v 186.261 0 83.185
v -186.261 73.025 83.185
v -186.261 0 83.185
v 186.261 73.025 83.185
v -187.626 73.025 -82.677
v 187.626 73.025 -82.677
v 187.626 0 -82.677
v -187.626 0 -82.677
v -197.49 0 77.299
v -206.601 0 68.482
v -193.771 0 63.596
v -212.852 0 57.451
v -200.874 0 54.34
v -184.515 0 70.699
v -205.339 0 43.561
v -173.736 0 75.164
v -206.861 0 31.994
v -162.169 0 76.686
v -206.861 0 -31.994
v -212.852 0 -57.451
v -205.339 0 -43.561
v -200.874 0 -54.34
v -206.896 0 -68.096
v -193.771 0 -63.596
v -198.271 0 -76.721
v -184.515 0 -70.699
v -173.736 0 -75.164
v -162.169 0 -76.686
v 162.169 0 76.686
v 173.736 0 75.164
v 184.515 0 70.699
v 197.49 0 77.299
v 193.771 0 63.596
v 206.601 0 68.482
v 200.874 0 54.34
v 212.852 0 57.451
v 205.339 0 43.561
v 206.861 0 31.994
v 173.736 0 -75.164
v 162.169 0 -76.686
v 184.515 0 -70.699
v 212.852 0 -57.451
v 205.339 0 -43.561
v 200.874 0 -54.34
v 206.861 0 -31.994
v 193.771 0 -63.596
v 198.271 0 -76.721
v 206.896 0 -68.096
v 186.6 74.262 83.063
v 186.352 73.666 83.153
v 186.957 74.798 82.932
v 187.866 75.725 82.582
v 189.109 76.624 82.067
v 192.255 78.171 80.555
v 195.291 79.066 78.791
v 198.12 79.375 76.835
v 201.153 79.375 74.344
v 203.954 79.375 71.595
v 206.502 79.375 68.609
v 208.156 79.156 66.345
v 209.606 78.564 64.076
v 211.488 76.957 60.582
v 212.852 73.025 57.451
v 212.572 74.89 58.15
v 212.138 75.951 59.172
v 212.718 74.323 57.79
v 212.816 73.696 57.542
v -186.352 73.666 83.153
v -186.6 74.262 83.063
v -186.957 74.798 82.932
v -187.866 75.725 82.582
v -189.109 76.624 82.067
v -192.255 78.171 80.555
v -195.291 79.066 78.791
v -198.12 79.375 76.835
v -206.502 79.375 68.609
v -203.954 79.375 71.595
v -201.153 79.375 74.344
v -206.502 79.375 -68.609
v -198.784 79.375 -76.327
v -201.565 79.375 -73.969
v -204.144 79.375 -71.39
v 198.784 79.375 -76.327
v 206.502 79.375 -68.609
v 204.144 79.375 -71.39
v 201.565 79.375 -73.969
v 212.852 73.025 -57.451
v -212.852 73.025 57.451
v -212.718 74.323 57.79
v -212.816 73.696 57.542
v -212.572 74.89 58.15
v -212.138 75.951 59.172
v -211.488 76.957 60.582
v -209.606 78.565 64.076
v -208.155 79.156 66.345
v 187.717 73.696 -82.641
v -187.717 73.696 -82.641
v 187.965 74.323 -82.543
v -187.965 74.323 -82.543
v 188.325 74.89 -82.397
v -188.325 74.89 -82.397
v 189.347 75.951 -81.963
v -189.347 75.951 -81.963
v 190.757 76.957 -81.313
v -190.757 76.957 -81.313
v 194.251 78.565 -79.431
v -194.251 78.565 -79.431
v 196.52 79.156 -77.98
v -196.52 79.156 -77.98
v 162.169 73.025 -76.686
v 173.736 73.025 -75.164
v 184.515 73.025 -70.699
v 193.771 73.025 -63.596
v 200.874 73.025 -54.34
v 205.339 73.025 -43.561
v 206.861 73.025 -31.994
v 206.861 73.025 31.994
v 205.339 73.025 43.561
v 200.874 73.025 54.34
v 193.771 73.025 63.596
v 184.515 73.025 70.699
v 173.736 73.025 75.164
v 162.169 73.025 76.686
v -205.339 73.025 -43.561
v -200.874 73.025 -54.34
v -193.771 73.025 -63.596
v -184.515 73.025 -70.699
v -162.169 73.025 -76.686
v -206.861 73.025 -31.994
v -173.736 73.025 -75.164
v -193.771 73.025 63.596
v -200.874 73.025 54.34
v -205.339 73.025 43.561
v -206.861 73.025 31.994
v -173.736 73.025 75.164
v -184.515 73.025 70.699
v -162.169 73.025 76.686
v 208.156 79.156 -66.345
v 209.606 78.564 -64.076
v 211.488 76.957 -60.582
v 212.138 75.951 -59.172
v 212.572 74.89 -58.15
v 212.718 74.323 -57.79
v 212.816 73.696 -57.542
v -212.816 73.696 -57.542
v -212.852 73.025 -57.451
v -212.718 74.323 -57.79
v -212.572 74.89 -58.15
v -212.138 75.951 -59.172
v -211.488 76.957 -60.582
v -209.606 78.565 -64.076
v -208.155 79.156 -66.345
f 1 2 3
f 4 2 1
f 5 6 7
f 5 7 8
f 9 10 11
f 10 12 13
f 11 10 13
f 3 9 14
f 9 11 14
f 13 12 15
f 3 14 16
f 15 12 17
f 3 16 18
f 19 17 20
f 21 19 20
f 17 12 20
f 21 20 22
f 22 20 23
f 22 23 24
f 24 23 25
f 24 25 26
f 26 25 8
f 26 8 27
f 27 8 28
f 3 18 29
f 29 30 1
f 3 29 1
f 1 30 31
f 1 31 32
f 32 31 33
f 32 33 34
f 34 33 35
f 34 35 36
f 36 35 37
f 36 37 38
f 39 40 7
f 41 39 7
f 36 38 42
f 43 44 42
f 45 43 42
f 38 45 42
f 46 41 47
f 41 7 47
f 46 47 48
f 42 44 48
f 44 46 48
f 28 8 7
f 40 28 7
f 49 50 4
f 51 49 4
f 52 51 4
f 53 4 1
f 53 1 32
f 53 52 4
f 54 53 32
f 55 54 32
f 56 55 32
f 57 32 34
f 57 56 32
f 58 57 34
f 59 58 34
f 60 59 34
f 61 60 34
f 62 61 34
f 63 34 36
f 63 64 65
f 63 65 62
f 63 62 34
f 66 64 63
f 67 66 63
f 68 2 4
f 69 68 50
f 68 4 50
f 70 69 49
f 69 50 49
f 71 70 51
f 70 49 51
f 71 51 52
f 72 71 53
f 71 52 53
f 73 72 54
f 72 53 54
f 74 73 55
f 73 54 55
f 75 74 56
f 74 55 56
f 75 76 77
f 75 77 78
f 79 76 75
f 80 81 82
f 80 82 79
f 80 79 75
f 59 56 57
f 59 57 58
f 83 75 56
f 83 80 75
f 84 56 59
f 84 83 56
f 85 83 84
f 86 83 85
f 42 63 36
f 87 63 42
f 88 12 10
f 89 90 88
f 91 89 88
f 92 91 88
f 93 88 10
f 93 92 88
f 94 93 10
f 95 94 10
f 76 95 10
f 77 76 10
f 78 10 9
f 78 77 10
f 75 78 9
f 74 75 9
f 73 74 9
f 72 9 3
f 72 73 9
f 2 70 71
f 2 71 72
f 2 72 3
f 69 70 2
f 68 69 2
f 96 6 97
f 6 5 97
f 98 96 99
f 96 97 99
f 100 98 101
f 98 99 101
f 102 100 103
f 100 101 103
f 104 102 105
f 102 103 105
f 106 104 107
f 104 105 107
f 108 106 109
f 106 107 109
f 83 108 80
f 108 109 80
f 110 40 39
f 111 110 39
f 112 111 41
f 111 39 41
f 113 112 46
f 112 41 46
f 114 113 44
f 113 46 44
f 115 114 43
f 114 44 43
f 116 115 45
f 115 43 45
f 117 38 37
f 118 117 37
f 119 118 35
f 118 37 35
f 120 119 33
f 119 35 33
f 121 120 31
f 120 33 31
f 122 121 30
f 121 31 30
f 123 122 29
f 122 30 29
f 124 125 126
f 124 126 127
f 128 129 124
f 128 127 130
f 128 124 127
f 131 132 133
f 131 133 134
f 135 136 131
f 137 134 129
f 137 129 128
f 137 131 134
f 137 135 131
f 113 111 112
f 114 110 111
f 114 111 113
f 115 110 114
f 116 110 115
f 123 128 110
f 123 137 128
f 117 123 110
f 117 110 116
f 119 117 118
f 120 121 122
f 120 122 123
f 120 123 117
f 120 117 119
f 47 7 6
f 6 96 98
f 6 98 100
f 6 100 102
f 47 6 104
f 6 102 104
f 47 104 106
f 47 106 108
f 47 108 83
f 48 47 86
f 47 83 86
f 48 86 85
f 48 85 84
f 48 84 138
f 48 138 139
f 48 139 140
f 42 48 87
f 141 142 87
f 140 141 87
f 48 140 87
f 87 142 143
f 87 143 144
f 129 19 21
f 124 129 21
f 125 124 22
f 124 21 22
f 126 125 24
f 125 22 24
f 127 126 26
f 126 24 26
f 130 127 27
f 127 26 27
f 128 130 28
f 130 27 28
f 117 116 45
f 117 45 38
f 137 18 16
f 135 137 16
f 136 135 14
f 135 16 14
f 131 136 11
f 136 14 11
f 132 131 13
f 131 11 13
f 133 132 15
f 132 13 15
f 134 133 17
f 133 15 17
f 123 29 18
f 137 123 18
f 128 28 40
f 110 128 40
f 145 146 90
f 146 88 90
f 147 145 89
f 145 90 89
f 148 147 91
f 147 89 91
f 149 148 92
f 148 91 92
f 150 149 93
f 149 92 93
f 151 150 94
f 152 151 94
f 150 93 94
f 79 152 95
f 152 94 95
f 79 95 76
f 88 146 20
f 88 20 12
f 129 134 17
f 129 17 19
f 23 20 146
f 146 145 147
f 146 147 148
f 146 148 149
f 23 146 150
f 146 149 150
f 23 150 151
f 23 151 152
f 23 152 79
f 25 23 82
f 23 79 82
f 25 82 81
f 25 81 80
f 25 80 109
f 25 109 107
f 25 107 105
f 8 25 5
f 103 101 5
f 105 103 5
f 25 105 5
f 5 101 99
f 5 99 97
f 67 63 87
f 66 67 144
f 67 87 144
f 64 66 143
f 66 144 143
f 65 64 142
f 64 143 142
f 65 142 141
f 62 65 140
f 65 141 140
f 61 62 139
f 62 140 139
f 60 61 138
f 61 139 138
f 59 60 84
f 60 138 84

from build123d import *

# Parameters (mm, degrees)
SKETCH1_W                  = 431.8
SKETCH1_H                  = 171.45
BOSS_EXTRUDE1_DEPTH        = 85.725
CUT_EXTRUDE1_DEPTH         = 73.025
FILLET3_R                  = 44.45
F_0_25_OFF_THE_TOP_DEPTH   = 6.35
SKETCH4_W                  = 431.8
SKETCH4_H                  = 79.375
F_0_12_OFF_THE_SIDE_DEPTH  = 2.54
SKETCH5_W                  = 168.91
SKETCH5_H                  = 79.375
F_0_12_OFF_THE_FRONT_DEPTH = 3.048
SKETCH6_W                  = 428.752
SKETCH6_H                  = 79.375
CUT_EXTRUDE5_DEPTH         = 3.048
SKETCH7_W                  = 165.862
SKETCH7_H                  = 79.375
CUT_EXTRUDE6_DEPTH         = 3.048
FILLET5_R                  = 6.35


with BuildPart() as part:
    # Sketch1 → Boss-Extrude1 (new body)
    with BuildSketch(Plane(origin=(0, 0, 0), x_dir=(1, 0, 0), z_dir=(0, 1, 0))):
        Rectangle(SKETCH1_W, SKETCH1_H)
    extrude(amount=BOSS_EXTRUDE1_DEPTH)

    # Sketch2 → Cut-Extrude1 (cut)
    with BuildSketch(Plane.XZ):
        with BuildLine():
            Line((162.16885638, 76.686434381), (-162.16885638, 76.686434381))
            ThreePointArc((-162.16885638, 76.686434381), (-193.771281353, 63.596281353), (-206.861434381, 31.99385638))
            Line((-206.861434381, 31.99385638), (-206.861434381, -31.99385638))
            ThreePointArc((-206.861434381, -31.99385638), (-193.771281353, -63.596281353), (-162.16885638, -76.686434381))
            Line((-162.16885638, -76.686434381), (162.16885638, -76.686434381))
            ThreePointArc((162.16885638, -76.686434381), (193.771281353, -63.596281353), (206.861434381, -31.99385638))
            Line((206.861434381, -31.99385638), (206.861434381, 31.99385638))
            ThreePointArc((206.861434381, 31.99385638), (193.771281353, 63.596281353), (162.16885638, 76.686434381))
        make_face()
    extrude(amount=-CUT_EXTRUDE1_DEPTH, mode=Mode.SUBTRACT)

    # Fillet3
    fillet3_edges = [part.edges().sort_by_distance(p)[0] for p in [
        (215.9, 42.8625, 85.725),
        (-215.9, 42.8625, 85.725),
        (-215.9, 42.8625, -85.725),
        (215.9, 42.8625, -85.725),
    ]]
    fillet(fillet3_edges, radius=FILLET3_R)

    # Sketch3 → 0.25 off the top (cut)
    with BuildSketch(Plane(origin=(0, 85.725, 0), x_dir=(1, 0, 0), z_dir=(0, 1, 0))):
        with BuildLine():
            Line((215.9, -41.275), (215.9, 41.275))
            ThreePointArc((215.9, 41.275), (202.880896424, 72.705896424), (171.45, 85.725))
            Line((171.45, 85.725), (-171.45, 85.725))
            ThreePointArc((-171.45, 85.725), (-202.880896424, 72.705896424), (-215.9, 41.275))
            Line((-215.9, 41.275), (-215.9, -41.275))
            ThreePointArc((-215.9, -41.275), (-202.880896424, -72.705896424), (-171.45, -85.725))
            Line((-171.45, -85.725), (171.45, -85.725))
            ThreePointArc((171.45, -85.725), (202.880896424, -72.705896424), (215.9, -41.275))
        make_face()
    extrude(amount=-F_0_25_OFF_THE_TOP_DEPTH, mode=Mode.SUBTRACT)

    # Sketch4 → 0.12 off the side (cut)
    with BuildSketch(Plane.XY.offset(85.725)):
        with Locations((0, 39.6875)):
            Rectangle(SKETCH4_W, SKETCH4_H)
    extrude(amount=-F_0_12_OFF_THE_SIDE_DEPTH, mode=Mode.SUBTRACT)

    # Sketch5 → 0.12 off the front (cut)
    with BuildSketch(Plane.ZY.offset(215.9)):
        with Locations((-1.27, 39.6875)):
            Rectangle(SKETCH5_W, SKETCH5_H)
    extrude(amount=-F_0_12_OFF_THE_FRONT_DEPTH, mode=Mode.SUBTRACT)

    # Sketch6 → Cut-Extrude5 (cut)
    with BuildSketch(Plane(origin=(0, 0, -85.725), x_dir=(-1, 0, 0), z_dir=(0, 0, -1))):
        with Locations((-1.524, 39.6875)):
            Rectangle(SKETCH6_W, SKETCH6_H)
    extrude(amount=-CUT_EXTRUDE5_DEPTH, mode=Mode.SUBTRACT)

    # Sketch7 → Cut-Extrude6 (cut)
    with BuildSketch(Plane(origin=(215.9, 0, 0), x_dir=(0, 0, -1), z_dir=(1, 0, 0))):
        with Locations((-0.254, 39.6875)):
            Rectangle(SKETCH7_W, SKETCH7_H)
    extrude(amount=-CUT_EXTRUDE6_DEPTH, mode=Mode.SUBTRACT)

    # Fillet5
    fillet5_edges = [part.edges().sort_by_distance(p)[0] for p in [
        (-212.852, 79.375, 0),
        (0, 79.375, -82.677),
        (212.852, 79.375, 0),
        (0, 79.375, 83.185),
    ]]
    fillet(fillet5_edges, radius=FILLET5_R)


solid = part.part
